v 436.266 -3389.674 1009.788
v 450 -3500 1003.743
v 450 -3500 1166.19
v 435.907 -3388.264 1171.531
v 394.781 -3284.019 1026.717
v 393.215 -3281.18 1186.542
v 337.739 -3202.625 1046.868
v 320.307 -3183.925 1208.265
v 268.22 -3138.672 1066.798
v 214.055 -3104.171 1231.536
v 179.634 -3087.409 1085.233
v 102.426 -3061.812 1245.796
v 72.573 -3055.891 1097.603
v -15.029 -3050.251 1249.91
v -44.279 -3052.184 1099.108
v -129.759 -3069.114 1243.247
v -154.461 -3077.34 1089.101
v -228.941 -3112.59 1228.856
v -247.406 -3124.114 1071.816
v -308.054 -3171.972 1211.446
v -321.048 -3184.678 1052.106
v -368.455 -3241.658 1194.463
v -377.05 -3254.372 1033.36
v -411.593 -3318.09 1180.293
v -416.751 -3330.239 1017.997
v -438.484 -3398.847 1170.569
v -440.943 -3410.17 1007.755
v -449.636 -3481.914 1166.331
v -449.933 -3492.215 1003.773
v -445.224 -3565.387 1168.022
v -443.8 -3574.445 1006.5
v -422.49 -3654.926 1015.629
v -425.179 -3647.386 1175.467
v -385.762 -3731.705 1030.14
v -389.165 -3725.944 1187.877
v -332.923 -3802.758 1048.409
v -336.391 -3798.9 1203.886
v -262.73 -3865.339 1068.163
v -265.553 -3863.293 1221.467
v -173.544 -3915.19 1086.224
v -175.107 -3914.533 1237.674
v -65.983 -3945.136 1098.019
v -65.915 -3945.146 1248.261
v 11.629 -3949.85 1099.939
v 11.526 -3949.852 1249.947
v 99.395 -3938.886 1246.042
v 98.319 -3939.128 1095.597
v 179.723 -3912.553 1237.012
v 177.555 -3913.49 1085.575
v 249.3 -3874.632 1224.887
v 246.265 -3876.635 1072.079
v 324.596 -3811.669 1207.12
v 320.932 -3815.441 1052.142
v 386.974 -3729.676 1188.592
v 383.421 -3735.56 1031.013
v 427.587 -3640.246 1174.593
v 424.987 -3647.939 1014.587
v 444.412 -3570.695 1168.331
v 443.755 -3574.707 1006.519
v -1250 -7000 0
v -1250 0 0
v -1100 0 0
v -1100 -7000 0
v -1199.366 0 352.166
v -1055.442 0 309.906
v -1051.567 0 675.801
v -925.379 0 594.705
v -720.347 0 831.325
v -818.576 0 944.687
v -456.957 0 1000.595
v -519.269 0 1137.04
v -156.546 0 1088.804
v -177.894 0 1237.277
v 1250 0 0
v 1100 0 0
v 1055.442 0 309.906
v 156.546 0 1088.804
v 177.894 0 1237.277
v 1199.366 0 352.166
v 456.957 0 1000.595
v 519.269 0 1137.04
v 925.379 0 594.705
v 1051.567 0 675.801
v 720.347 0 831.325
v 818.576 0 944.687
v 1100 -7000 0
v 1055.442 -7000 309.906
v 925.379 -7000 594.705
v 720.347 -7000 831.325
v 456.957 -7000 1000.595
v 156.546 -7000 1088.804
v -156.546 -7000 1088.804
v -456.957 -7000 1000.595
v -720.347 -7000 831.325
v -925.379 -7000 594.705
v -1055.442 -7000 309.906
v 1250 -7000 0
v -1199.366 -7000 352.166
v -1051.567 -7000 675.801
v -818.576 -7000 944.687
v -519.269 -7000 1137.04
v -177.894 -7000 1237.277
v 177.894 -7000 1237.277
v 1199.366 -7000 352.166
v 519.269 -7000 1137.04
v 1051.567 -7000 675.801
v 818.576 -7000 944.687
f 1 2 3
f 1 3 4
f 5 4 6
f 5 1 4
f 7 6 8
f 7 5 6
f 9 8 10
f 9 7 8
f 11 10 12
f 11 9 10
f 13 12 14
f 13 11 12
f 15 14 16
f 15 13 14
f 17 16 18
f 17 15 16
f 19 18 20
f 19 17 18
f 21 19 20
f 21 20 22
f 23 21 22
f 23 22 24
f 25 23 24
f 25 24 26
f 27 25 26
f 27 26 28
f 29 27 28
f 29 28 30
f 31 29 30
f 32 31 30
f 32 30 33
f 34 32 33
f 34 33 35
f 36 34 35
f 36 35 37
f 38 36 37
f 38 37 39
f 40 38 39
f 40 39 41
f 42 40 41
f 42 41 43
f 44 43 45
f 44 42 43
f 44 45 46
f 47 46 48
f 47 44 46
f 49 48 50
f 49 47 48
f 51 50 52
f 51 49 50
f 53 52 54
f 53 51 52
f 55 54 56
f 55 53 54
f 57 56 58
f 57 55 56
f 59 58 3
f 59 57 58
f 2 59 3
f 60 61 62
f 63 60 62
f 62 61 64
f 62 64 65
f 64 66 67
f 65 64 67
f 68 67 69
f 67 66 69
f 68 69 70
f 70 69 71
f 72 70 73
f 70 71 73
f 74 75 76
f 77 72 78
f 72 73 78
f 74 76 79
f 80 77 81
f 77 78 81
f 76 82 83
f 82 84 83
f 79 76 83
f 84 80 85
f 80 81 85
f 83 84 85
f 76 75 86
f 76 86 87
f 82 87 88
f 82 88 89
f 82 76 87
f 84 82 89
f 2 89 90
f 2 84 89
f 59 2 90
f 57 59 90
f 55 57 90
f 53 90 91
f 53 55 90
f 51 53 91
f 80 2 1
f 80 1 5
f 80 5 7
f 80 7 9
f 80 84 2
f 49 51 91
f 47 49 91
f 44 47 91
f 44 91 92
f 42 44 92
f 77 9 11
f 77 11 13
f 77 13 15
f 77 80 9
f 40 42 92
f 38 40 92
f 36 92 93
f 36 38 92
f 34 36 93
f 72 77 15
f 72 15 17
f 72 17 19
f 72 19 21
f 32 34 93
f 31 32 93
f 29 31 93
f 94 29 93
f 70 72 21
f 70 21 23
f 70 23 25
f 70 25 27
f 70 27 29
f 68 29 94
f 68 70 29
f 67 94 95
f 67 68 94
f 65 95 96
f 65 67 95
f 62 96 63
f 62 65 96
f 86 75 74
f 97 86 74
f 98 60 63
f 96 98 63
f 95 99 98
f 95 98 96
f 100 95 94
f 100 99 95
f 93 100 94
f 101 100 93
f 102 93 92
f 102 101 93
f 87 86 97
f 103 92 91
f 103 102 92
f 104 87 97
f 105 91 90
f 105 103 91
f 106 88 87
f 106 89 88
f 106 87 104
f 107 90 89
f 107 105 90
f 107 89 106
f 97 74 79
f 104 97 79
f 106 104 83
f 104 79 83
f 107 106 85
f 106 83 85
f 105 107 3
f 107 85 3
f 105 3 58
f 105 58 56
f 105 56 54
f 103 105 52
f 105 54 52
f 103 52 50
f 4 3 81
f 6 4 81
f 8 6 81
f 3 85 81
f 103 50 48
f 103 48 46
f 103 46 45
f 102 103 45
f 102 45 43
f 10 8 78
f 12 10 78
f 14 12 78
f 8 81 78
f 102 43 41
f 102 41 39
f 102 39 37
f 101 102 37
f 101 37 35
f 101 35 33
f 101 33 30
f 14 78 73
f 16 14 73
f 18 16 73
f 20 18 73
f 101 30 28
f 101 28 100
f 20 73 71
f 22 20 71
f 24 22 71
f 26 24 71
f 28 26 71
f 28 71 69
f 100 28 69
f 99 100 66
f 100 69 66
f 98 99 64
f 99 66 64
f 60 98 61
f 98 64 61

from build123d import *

# Parameters (mm, degrees)
F0_R     = 1250
F0_R_2   = 1100
F1_DEPTH = 7000
F2_W     = 4350.551486
F2_H     = 1751.117468
F3_DEPTH = 8000
F4_R     = 450
F5_DEPTH = 10000


with BuildPart() as f1:
    # F0 (on Front) → F1 (new body)
    with BuildSketch(Plane.XZ):
        Circle(F0_R)
        Circle(F0_R_2, mode=Mode.SUBTRACT)
    extrude(amount=F1_DEPTH)

    # F2 (on Front) → F3 (cut)
    with BuildSketch(Plane.XZ):
        with Locations((180.131257, -875.558734)):
            Rectangle(F2_W, F2_H)
    extrude(amount=F3_DEPTH, mode=Mode.SUBTRACT)

    # F4 (on Top) → F5 (cut)
    with BuildSketch(Plane.XY):
        with Locations((0, -3500)):
            Circle(F4_R)
    extrude(amount=F5_DEPTH, mode=Mode.SUBTRACT)


solid = f1.part
